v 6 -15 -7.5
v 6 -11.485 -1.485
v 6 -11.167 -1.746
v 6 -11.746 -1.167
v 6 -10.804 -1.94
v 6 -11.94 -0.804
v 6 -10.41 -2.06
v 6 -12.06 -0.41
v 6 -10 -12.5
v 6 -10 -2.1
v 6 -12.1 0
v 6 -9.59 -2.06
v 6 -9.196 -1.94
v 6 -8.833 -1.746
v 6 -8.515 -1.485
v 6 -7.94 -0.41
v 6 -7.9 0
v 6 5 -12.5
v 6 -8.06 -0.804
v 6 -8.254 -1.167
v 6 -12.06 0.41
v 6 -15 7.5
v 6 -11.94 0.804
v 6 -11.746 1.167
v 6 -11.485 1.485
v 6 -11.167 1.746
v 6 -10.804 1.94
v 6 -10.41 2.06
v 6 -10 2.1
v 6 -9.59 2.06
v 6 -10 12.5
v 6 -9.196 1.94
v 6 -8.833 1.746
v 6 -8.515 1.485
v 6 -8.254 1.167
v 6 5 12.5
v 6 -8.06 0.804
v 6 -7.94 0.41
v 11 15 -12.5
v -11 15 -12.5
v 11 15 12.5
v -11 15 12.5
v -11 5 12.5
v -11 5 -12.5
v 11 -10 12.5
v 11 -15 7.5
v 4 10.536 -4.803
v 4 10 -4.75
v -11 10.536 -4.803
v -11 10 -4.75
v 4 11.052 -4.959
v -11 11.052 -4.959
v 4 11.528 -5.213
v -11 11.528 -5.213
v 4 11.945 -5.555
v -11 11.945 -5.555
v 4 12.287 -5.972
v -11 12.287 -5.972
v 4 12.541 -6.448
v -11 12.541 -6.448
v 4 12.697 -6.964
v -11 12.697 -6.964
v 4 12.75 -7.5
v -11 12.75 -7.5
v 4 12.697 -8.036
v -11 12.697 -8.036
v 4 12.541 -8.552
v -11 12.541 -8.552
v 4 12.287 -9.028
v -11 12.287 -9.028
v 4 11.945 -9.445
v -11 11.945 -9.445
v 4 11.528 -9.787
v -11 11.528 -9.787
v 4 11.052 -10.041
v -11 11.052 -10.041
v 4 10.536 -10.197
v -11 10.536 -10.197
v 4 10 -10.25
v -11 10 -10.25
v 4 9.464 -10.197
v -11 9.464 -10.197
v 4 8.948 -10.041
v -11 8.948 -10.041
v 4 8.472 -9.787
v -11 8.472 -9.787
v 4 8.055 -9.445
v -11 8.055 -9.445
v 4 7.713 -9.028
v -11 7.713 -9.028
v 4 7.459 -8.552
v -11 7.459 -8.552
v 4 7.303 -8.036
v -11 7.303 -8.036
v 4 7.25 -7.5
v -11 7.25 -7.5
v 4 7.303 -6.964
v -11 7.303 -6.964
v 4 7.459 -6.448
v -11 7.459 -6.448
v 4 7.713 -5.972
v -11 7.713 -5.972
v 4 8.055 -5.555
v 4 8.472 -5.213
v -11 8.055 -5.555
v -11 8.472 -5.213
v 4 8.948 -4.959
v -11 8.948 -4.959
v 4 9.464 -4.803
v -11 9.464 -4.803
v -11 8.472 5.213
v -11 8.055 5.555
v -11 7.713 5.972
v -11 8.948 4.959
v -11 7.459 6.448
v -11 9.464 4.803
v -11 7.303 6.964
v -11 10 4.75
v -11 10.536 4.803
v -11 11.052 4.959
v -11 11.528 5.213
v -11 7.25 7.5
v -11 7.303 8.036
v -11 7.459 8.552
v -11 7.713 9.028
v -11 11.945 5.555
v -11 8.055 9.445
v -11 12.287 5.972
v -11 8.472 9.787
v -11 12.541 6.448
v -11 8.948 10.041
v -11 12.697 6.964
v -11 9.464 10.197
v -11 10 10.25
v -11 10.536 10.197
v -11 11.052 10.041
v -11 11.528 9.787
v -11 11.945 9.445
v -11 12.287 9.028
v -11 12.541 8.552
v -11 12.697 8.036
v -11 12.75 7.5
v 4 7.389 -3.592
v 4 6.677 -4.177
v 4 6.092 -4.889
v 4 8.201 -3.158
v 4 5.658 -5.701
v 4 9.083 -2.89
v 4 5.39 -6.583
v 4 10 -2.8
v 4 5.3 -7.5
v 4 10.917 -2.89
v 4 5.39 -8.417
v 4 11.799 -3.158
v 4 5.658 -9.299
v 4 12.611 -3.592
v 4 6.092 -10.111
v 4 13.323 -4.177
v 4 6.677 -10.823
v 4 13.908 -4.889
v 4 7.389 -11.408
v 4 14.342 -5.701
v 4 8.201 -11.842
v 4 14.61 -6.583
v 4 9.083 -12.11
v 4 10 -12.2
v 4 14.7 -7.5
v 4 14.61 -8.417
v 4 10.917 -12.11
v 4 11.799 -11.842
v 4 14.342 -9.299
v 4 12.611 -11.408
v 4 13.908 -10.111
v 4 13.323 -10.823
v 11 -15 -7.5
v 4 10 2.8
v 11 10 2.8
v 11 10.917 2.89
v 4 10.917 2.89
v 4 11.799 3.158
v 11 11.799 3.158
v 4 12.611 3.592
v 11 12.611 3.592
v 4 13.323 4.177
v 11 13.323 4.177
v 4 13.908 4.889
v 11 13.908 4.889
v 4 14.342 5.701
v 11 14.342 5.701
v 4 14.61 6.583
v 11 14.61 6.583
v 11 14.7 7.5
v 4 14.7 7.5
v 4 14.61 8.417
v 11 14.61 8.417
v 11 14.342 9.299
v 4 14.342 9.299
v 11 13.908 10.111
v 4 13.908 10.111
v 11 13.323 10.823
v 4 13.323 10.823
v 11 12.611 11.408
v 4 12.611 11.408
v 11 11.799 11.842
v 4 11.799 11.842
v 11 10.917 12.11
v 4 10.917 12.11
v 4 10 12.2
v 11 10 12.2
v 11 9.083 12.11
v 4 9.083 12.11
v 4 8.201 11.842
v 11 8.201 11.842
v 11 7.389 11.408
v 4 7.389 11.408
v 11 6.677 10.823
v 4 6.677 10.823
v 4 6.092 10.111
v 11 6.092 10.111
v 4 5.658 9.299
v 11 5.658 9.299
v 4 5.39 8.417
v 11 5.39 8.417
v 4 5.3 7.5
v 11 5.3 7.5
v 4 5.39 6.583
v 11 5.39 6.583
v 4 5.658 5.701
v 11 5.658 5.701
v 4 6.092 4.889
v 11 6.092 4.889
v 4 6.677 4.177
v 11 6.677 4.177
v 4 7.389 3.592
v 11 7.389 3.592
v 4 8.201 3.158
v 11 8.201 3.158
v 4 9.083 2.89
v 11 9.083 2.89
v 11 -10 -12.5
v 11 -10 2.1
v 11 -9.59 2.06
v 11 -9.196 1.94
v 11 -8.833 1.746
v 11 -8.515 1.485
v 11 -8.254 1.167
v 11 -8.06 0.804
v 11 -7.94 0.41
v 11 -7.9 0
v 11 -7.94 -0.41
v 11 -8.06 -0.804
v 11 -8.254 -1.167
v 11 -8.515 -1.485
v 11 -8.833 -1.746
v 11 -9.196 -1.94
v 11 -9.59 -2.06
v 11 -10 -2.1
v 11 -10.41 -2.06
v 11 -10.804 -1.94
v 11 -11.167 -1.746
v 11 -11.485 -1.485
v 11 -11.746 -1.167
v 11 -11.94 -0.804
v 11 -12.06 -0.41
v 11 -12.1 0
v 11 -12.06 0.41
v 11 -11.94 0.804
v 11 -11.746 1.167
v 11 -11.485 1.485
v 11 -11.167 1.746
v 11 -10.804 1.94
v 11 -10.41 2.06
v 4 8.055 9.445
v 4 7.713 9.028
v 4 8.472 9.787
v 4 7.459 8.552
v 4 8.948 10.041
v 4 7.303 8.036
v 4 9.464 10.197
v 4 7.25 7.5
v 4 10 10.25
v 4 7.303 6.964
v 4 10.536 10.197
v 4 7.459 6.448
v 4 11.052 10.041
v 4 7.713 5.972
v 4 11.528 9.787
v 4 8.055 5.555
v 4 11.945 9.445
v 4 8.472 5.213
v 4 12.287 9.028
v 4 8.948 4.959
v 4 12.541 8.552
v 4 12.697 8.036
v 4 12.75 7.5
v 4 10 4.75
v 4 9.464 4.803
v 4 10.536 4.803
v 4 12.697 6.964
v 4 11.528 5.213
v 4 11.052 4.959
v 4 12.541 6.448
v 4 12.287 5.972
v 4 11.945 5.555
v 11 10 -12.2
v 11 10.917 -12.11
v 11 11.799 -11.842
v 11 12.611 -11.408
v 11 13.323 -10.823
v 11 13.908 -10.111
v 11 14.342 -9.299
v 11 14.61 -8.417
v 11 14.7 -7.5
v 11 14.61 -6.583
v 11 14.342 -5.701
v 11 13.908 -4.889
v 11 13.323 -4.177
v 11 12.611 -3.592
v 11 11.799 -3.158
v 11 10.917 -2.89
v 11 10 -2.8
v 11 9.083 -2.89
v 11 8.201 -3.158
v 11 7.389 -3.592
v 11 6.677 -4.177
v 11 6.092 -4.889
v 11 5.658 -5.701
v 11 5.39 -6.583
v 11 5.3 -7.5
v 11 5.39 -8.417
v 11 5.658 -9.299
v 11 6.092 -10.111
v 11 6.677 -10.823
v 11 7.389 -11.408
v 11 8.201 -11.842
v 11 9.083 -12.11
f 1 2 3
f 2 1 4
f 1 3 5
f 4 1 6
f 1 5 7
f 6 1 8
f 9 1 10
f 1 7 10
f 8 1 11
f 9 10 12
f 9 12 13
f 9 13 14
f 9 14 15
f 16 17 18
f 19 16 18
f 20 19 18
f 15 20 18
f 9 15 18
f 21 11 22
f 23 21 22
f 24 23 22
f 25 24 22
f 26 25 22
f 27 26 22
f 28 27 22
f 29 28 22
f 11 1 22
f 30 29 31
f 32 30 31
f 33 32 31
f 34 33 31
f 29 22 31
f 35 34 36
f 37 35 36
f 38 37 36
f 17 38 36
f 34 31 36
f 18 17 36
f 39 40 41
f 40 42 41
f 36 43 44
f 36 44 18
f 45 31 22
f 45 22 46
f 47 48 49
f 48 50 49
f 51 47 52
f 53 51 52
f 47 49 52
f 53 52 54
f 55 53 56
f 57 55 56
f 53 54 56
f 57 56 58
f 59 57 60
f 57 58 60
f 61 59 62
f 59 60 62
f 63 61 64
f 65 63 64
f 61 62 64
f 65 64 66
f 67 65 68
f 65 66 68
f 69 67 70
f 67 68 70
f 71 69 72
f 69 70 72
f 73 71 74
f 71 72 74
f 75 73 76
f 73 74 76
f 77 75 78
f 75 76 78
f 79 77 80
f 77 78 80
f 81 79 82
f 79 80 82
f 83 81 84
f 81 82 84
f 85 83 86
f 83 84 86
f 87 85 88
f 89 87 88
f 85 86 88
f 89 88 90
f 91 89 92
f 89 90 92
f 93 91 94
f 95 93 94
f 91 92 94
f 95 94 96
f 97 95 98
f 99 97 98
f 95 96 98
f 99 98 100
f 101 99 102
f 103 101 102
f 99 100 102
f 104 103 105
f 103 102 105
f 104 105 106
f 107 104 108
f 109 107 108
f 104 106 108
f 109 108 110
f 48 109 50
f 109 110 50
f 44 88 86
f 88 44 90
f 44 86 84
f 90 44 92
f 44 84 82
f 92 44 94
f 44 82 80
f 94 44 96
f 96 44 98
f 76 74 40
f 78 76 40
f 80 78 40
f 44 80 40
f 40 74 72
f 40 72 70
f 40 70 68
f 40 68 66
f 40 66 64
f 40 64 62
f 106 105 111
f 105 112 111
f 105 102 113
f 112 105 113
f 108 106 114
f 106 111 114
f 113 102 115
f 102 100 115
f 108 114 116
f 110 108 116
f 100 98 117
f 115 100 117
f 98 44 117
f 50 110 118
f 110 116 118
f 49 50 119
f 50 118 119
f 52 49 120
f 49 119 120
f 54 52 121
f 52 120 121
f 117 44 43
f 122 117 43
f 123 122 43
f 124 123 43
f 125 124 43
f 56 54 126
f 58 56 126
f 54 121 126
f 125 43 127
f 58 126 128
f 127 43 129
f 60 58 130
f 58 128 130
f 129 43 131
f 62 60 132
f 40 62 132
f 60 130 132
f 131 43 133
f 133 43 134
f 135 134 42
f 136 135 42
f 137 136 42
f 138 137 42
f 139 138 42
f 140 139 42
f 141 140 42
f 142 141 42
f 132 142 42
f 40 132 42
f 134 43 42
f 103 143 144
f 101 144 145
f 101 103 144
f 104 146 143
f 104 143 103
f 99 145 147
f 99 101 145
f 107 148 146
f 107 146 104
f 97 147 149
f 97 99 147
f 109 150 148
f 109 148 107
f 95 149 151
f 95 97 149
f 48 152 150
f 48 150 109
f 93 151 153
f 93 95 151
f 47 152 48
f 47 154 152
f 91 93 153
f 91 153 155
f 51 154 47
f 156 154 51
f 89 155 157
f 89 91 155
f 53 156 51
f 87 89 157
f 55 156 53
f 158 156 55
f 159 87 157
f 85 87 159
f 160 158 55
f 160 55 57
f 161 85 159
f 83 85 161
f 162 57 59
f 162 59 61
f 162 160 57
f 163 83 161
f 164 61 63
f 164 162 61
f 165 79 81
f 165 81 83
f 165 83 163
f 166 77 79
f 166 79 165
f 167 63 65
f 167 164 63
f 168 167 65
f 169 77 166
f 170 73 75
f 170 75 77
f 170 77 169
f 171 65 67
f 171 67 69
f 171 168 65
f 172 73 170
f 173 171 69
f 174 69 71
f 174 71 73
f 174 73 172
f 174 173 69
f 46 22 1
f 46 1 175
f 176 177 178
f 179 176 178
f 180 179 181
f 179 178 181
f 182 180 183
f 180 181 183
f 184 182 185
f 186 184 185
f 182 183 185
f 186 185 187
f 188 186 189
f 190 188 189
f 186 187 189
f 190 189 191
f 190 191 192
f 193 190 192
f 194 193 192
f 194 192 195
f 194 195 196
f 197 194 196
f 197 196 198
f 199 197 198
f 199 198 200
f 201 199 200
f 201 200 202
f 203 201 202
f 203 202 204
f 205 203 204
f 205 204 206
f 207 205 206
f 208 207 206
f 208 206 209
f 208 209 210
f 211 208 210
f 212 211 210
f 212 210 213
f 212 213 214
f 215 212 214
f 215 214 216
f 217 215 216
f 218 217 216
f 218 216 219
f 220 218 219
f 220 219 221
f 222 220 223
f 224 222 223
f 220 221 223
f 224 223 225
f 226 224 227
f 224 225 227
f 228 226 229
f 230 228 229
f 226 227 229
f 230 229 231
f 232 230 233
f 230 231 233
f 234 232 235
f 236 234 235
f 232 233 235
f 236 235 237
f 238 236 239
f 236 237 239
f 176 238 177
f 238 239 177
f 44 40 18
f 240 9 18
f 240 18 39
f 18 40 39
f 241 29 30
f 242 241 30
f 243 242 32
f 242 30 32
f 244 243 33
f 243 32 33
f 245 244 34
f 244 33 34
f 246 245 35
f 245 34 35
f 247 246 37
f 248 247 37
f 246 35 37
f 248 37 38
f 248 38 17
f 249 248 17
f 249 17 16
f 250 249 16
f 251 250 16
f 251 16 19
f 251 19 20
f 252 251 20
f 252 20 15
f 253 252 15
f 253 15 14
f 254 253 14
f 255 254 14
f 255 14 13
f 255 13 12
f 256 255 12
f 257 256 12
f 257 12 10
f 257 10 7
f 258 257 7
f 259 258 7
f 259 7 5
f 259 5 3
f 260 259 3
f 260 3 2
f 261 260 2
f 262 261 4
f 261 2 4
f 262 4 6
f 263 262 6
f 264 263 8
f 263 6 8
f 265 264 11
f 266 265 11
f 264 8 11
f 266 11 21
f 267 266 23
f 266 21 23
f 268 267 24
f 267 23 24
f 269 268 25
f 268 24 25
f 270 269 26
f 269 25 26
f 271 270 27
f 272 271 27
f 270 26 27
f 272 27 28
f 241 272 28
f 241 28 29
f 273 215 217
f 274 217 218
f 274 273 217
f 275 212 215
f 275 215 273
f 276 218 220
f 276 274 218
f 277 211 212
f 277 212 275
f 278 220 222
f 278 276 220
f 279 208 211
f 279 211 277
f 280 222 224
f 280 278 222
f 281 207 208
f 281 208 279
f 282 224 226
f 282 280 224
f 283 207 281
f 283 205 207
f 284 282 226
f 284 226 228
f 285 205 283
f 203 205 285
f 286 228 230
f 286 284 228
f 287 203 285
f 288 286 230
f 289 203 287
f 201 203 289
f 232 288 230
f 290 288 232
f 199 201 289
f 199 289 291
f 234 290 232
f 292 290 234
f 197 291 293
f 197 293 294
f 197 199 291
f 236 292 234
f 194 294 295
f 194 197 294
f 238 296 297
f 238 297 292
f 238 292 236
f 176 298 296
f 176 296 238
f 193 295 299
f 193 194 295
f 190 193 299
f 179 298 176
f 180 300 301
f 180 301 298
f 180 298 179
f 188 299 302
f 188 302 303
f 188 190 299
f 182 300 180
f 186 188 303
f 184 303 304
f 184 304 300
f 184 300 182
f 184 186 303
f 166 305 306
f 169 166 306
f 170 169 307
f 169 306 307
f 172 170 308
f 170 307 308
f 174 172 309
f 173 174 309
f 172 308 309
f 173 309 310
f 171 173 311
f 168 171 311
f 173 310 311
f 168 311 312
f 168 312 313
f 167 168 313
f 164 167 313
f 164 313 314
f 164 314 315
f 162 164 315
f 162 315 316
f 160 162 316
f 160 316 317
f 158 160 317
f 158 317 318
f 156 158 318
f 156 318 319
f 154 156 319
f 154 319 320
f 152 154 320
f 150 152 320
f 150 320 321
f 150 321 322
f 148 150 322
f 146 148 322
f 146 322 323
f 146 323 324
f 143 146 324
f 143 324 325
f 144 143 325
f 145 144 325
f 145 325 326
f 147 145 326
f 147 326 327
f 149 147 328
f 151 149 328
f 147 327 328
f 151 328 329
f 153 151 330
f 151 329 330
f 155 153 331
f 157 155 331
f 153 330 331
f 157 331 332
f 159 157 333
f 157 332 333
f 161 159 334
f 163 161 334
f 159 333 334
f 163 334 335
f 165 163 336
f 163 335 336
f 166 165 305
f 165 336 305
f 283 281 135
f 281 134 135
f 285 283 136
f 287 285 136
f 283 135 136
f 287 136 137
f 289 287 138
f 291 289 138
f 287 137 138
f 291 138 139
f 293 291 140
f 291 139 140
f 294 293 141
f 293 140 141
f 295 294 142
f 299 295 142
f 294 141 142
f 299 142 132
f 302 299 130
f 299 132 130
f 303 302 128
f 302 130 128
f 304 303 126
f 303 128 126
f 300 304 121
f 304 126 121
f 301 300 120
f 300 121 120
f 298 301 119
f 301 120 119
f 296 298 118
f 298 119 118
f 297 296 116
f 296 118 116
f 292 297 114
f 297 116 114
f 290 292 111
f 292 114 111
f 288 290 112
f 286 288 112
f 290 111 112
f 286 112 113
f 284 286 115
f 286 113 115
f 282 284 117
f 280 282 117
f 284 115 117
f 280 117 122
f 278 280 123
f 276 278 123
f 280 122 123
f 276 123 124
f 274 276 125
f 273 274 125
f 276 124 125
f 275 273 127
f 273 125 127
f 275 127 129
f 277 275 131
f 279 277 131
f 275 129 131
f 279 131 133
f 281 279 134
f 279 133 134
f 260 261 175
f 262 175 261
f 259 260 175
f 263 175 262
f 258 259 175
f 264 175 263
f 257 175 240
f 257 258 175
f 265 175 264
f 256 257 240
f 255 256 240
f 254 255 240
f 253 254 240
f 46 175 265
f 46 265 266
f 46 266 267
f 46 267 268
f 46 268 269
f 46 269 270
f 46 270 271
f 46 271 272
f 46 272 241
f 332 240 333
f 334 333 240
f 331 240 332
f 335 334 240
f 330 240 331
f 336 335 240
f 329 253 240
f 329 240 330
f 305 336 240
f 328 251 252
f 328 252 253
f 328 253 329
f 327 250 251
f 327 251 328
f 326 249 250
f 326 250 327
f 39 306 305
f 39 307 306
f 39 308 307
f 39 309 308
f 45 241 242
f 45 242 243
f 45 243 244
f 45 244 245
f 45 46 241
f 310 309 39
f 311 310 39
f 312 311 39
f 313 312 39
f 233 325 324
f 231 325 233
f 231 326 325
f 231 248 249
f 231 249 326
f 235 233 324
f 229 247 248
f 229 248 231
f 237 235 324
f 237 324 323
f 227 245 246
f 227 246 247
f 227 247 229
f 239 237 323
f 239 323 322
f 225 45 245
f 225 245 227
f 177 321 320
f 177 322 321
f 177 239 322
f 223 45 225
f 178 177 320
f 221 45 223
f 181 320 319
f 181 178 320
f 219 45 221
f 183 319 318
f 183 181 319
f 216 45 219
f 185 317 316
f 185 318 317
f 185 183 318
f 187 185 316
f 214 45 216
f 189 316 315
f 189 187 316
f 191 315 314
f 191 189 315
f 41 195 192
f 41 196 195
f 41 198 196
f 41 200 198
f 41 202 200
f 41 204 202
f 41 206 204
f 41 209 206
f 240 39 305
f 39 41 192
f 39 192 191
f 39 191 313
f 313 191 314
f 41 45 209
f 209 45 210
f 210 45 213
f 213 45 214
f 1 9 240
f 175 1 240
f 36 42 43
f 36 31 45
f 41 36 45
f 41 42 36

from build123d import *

# Parameters (mm, degrees)
SKETCH_2_W                = 22
SKETCH_2_H                = 30
EXTRUDE_1_DEPTH           = 12.5
SKETCH_3_W                = 17
SKETCH_3_H                = 20
CUT_EXTRUDE_1_DEPTH       = 32.160872902
HOLE_WIZARD_1_D           = 5.5
HOLE_WIZARD_1_CBORE_D     = 9.4
HOLE_WIZARD_1_CBORE_DEPTH = 7
HOLE_WIZARD_M5_1_D        = 4.2
CHAMFER_1_SIZE            = 5


with BuildPart() as part:
    # 草图2 → 凸台-拉伸1 (new, symmetric)
    with BuildSketch(Plane.XY):
        Rectangle(SKETCH_2_W, SKETCH_2_H)
    extrude(amount=EXTRUDE_1_DEPTH, both=True)

    # 草图3 → 切除-拉伸1 (cut, through all)
    with BuildSketch(Plane.XY.offset(12.5)):
        with Locations((-2.5, -5)):
            Rectangle(SKETCH_3_W, SKETCH_3_H)
    extrude(amount=-CUT_EXTRUDE_1_DEPTH, mode=Mode.SUBTRACT)

    # 打孔尺寸根据内六角圆柱头螺钉的类型1 (through all)
    with Locations(Plane(origin=(11, 0, 0), x_dir=(0, 0, -1), z_dir=(1, 0, 0))):
        with Locations((7.5, 10), (-7.5, 10)):
            CounterBoreHole(HOLE_WIZARD_1_D / 2, HOLE_WIZARD_1_CBORE_D / 2, HOLE_WIZARD_1_CBORE_DEPTH)

    # M5 螺纹孔1 (through all)
    with Locations(Plane(origin=(11, 0, 0), x_dir=(0, 0, -1), z_dir=(1, 0, 0))):
        with Locations((0, -10)):
            Hole(HOLE_WIZARD_M5_1_D / 2)

    # 倒角1
    chamfer_1_edges = [part.edges().sort_by_distance(p)[0] for p in [
        (8.5, -15, -12.5),
        (8.5, -15, 12.5),
    ]]
    chamfer(chamfer_1_edges, length=CHAMFER_1_SIZE)


solid = part.part
